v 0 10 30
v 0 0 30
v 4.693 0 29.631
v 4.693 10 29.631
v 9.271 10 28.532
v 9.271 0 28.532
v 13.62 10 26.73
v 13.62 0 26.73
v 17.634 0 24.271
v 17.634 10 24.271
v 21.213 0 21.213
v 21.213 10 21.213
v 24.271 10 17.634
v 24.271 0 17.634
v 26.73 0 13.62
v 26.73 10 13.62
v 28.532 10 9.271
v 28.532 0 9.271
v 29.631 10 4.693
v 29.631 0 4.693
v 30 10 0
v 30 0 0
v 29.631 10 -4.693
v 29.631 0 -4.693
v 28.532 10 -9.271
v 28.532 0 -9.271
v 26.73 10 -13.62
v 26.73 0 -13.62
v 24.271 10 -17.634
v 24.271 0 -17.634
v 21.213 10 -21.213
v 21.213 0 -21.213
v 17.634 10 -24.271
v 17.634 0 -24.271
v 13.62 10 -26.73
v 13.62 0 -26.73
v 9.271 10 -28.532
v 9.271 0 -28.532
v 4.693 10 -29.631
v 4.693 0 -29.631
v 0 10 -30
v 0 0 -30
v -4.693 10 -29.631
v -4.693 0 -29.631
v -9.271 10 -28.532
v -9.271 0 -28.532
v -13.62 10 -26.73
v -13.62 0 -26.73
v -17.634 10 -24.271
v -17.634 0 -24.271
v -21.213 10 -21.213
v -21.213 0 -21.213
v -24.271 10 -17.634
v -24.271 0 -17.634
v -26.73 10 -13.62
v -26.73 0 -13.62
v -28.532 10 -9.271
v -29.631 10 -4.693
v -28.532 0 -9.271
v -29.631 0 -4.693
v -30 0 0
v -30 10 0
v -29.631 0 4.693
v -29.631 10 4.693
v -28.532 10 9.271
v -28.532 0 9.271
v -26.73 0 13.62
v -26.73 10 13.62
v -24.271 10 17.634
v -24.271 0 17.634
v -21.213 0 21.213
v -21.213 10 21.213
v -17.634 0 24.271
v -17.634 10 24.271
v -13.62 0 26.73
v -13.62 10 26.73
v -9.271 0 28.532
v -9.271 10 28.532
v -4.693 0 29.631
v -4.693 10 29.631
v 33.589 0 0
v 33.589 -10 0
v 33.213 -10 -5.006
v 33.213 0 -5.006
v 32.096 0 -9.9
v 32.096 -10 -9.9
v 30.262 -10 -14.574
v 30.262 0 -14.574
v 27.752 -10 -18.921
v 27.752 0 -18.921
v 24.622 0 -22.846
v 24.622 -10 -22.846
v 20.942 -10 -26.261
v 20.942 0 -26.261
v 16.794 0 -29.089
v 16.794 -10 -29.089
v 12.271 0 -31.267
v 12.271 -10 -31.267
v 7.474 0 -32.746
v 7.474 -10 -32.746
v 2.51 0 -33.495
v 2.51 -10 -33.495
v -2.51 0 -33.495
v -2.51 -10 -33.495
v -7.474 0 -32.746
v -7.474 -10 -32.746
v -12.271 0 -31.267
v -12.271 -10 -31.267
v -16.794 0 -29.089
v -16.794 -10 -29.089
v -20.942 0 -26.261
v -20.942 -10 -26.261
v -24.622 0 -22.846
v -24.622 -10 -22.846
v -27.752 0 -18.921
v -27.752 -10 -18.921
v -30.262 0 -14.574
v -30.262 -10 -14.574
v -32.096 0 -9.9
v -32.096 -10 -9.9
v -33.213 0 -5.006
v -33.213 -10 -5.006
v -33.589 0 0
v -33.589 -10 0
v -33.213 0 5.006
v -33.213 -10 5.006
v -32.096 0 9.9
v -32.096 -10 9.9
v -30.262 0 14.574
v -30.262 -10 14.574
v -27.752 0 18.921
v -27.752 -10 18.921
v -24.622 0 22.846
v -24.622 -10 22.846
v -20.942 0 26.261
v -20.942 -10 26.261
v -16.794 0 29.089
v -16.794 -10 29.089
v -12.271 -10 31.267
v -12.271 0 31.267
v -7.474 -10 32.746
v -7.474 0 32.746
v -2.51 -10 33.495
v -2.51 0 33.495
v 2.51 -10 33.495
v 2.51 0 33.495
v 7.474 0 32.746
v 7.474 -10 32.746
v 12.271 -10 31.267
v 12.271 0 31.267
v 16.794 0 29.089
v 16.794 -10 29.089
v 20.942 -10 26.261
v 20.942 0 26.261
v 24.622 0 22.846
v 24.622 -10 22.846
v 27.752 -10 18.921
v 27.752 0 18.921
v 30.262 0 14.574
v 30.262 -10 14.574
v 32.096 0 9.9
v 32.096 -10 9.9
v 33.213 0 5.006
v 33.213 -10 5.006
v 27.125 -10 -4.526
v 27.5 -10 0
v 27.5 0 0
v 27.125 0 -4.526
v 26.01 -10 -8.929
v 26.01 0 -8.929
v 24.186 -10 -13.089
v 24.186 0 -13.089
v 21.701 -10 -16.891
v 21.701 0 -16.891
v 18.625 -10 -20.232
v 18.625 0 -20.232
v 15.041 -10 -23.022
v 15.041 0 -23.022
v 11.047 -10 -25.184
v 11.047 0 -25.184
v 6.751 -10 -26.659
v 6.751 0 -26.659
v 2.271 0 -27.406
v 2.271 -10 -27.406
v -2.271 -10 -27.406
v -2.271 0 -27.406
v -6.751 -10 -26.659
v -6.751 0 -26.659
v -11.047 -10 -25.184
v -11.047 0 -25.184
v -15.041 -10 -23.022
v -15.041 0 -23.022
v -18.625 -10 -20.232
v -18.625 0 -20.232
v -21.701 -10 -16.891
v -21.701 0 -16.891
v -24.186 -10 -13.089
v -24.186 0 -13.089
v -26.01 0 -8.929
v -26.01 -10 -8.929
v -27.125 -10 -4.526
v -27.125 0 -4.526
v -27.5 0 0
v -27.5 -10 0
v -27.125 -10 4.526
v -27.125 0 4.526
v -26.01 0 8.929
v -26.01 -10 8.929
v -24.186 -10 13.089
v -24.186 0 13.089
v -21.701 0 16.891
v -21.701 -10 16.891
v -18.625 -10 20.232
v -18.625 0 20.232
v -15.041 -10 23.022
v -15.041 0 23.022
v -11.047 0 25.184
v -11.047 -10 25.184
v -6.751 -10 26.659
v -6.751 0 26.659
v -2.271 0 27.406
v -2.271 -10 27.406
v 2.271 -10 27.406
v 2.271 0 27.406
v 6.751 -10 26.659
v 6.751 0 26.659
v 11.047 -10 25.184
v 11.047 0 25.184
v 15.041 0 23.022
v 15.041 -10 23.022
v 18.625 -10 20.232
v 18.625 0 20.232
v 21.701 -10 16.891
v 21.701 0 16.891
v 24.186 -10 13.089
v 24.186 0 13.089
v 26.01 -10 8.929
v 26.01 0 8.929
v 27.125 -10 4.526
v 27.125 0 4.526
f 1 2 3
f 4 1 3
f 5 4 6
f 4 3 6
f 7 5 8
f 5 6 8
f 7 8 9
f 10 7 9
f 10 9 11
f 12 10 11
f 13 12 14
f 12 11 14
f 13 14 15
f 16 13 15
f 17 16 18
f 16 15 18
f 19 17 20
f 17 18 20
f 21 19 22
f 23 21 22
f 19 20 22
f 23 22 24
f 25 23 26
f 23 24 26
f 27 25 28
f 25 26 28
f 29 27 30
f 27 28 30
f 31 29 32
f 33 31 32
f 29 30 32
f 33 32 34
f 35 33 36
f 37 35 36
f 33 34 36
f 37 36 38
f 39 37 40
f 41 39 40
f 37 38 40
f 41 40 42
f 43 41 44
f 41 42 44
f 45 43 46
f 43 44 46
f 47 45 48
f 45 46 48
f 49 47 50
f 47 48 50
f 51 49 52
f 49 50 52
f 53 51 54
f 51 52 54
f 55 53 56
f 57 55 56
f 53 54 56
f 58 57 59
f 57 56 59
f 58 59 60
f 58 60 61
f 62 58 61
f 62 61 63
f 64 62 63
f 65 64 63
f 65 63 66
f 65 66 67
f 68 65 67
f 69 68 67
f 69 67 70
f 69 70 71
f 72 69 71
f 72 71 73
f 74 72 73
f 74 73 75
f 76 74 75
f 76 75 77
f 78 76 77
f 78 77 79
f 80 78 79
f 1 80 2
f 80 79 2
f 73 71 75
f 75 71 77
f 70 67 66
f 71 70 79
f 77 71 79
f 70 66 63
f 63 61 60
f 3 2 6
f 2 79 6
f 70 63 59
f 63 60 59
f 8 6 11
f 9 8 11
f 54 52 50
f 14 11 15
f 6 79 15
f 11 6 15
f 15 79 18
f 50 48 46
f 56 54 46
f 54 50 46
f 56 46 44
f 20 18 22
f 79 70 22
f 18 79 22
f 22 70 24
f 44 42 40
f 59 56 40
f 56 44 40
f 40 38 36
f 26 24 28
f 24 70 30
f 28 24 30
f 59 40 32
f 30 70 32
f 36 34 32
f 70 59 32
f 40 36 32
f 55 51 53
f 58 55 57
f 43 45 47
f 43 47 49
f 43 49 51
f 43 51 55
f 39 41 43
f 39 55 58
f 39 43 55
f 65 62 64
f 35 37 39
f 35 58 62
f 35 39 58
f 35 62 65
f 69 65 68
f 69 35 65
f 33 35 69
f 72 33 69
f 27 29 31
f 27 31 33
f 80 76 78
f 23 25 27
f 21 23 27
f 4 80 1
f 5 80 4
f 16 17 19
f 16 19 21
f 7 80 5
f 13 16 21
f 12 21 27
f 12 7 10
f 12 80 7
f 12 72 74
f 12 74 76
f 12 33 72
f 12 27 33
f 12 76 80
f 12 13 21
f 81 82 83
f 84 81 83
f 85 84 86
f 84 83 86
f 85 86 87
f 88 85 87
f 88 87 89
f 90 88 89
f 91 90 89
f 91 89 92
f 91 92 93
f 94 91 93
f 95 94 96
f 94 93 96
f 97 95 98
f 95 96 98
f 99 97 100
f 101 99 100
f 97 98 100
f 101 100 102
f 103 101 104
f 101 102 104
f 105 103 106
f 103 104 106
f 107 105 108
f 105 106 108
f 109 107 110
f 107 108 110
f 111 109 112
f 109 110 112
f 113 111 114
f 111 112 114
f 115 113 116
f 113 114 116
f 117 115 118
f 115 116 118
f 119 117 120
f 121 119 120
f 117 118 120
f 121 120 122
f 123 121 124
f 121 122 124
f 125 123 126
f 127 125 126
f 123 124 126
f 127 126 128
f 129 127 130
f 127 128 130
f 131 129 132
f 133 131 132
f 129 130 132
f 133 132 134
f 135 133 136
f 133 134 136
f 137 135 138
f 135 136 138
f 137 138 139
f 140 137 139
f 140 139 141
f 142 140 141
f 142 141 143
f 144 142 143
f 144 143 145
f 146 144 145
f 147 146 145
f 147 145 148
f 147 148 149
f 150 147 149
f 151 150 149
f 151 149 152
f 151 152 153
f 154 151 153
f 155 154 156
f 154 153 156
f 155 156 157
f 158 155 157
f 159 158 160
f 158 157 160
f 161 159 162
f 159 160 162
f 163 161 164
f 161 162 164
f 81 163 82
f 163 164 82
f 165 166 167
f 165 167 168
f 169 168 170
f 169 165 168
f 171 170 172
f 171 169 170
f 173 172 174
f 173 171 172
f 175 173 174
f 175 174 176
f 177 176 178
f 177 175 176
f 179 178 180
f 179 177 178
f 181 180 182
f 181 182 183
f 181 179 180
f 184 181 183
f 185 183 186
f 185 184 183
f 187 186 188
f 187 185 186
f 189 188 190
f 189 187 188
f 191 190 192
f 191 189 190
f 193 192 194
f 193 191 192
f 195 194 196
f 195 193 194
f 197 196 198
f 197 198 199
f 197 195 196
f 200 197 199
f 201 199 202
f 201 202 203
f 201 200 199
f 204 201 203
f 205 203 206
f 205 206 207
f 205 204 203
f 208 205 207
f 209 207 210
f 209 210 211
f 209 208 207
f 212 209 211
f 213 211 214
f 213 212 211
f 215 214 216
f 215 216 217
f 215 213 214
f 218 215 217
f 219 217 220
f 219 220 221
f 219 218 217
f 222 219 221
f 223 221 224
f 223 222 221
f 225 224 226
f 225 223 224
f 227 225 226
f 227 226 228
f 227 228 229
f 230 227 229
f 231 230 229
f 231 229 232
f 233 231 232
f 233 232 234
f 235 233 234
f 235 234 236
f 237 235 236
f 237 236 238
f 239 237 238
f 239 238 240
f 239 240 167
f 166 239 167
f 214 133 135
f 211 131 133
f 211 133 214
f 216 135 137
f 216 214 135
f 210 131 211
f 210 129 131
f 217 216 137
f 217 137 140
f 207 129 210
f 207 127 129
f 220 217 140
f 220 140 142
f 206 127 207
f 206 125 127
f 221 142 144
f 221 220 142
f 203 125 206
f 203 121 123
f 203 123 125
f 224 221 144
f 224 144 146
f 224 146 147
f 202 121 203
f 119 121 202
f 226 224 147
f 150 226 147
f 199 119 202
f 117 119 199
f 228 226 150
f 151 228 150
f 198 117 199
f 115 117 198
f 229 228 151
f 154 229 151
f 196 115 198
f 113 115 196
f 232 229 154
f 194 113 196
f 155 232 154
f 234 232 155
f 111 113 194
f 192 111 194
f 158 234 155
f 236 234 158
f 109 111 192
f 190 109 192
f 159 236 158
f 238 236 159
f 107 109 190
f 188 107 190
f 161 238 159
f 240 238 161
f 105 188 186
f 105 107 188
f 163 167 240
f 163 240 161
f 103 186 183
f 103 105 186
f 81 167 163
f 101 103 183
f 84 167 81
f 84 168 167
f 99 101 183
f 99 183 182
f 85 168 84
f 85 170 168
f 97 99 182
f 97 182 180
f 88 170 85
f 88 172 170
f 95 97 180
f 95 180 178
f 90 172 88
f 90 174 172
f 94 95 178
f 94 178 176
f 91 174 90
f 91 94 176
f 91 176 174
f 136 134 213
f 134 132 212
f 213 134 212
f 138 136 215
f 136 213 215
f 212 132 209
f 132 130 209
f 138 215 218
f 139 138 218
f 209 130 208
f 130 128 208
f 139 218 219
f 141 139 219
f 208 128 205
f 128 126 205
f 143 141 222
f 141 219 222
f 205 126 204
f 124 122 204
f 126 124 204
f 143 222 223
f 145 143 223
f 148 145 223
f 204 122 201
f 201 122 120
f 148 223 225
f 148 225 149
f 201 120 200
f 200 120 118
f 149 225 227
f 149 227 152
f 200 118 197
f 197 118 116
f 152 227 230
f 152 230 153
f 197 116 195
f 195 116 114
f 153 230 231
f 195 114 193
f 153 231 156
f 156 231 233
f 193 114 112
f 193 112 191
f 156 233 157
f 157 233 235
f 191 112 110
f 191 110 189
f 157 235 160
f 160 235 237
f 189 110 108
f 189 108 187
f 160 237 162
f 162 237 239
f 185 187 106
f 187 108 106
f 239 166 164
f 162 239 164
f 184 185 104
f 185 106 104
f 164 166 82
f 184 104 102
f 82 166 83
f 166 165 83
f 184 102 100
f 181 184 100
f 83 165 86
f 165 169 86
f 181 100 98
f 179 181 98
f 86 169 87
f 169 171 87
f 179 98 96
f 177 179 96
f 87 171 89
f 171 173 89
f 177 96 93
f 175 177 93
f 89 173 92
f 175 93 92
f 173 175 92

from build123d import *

# Parameters (mm, degrees)
SKETCH1_R           = 30
BOSS_EXTRUDE1_DEPTH = 10
SKETCH2_R           = 33.588527639
SKETCH2_R_2         = 27.5
BOSS_EXTRUDE2_DEPTH = 10


with BuildPart() as part:
    # Sketch1 → Boss-Extrude1 (new body)
    with BuildSketch(Plane(origin=(0, 0, 0), x_dir=(1, 0, 0), z_dir=(0, 1, 0))):
        Circle(SKETCH1_R)
    extrude(amount=BOSS_EXTRUDE1_DEPTH)

    # Sketch2 → Boss-Extrude2 (add)
    with BuildSketch(Plane(origin=(0, 0, 0), x_dir=(-1, 0, 0), z_dir=(0, -1, 0))):
        Circle(SKETCH2_R)
        Circle(SKETCH2_R_2, mode=Mode.SUBTRACT)
    extrude(amount=BOSS_EXTRUDE2_DEPTH)


with BuildPart() as body_2:
    # Split1: the piece on the far side of the plane
    add(part.part)
    split(bisect_by=Plane.ZX, keep=Keep.BOTTOM)


with BuildPart() as part_1:
    add(part.part)

    # Split1
    split(bisect_by=Plane.ZX, keep=Keep.TOP)


solid = Compound([body_2.part, part_1.part])
